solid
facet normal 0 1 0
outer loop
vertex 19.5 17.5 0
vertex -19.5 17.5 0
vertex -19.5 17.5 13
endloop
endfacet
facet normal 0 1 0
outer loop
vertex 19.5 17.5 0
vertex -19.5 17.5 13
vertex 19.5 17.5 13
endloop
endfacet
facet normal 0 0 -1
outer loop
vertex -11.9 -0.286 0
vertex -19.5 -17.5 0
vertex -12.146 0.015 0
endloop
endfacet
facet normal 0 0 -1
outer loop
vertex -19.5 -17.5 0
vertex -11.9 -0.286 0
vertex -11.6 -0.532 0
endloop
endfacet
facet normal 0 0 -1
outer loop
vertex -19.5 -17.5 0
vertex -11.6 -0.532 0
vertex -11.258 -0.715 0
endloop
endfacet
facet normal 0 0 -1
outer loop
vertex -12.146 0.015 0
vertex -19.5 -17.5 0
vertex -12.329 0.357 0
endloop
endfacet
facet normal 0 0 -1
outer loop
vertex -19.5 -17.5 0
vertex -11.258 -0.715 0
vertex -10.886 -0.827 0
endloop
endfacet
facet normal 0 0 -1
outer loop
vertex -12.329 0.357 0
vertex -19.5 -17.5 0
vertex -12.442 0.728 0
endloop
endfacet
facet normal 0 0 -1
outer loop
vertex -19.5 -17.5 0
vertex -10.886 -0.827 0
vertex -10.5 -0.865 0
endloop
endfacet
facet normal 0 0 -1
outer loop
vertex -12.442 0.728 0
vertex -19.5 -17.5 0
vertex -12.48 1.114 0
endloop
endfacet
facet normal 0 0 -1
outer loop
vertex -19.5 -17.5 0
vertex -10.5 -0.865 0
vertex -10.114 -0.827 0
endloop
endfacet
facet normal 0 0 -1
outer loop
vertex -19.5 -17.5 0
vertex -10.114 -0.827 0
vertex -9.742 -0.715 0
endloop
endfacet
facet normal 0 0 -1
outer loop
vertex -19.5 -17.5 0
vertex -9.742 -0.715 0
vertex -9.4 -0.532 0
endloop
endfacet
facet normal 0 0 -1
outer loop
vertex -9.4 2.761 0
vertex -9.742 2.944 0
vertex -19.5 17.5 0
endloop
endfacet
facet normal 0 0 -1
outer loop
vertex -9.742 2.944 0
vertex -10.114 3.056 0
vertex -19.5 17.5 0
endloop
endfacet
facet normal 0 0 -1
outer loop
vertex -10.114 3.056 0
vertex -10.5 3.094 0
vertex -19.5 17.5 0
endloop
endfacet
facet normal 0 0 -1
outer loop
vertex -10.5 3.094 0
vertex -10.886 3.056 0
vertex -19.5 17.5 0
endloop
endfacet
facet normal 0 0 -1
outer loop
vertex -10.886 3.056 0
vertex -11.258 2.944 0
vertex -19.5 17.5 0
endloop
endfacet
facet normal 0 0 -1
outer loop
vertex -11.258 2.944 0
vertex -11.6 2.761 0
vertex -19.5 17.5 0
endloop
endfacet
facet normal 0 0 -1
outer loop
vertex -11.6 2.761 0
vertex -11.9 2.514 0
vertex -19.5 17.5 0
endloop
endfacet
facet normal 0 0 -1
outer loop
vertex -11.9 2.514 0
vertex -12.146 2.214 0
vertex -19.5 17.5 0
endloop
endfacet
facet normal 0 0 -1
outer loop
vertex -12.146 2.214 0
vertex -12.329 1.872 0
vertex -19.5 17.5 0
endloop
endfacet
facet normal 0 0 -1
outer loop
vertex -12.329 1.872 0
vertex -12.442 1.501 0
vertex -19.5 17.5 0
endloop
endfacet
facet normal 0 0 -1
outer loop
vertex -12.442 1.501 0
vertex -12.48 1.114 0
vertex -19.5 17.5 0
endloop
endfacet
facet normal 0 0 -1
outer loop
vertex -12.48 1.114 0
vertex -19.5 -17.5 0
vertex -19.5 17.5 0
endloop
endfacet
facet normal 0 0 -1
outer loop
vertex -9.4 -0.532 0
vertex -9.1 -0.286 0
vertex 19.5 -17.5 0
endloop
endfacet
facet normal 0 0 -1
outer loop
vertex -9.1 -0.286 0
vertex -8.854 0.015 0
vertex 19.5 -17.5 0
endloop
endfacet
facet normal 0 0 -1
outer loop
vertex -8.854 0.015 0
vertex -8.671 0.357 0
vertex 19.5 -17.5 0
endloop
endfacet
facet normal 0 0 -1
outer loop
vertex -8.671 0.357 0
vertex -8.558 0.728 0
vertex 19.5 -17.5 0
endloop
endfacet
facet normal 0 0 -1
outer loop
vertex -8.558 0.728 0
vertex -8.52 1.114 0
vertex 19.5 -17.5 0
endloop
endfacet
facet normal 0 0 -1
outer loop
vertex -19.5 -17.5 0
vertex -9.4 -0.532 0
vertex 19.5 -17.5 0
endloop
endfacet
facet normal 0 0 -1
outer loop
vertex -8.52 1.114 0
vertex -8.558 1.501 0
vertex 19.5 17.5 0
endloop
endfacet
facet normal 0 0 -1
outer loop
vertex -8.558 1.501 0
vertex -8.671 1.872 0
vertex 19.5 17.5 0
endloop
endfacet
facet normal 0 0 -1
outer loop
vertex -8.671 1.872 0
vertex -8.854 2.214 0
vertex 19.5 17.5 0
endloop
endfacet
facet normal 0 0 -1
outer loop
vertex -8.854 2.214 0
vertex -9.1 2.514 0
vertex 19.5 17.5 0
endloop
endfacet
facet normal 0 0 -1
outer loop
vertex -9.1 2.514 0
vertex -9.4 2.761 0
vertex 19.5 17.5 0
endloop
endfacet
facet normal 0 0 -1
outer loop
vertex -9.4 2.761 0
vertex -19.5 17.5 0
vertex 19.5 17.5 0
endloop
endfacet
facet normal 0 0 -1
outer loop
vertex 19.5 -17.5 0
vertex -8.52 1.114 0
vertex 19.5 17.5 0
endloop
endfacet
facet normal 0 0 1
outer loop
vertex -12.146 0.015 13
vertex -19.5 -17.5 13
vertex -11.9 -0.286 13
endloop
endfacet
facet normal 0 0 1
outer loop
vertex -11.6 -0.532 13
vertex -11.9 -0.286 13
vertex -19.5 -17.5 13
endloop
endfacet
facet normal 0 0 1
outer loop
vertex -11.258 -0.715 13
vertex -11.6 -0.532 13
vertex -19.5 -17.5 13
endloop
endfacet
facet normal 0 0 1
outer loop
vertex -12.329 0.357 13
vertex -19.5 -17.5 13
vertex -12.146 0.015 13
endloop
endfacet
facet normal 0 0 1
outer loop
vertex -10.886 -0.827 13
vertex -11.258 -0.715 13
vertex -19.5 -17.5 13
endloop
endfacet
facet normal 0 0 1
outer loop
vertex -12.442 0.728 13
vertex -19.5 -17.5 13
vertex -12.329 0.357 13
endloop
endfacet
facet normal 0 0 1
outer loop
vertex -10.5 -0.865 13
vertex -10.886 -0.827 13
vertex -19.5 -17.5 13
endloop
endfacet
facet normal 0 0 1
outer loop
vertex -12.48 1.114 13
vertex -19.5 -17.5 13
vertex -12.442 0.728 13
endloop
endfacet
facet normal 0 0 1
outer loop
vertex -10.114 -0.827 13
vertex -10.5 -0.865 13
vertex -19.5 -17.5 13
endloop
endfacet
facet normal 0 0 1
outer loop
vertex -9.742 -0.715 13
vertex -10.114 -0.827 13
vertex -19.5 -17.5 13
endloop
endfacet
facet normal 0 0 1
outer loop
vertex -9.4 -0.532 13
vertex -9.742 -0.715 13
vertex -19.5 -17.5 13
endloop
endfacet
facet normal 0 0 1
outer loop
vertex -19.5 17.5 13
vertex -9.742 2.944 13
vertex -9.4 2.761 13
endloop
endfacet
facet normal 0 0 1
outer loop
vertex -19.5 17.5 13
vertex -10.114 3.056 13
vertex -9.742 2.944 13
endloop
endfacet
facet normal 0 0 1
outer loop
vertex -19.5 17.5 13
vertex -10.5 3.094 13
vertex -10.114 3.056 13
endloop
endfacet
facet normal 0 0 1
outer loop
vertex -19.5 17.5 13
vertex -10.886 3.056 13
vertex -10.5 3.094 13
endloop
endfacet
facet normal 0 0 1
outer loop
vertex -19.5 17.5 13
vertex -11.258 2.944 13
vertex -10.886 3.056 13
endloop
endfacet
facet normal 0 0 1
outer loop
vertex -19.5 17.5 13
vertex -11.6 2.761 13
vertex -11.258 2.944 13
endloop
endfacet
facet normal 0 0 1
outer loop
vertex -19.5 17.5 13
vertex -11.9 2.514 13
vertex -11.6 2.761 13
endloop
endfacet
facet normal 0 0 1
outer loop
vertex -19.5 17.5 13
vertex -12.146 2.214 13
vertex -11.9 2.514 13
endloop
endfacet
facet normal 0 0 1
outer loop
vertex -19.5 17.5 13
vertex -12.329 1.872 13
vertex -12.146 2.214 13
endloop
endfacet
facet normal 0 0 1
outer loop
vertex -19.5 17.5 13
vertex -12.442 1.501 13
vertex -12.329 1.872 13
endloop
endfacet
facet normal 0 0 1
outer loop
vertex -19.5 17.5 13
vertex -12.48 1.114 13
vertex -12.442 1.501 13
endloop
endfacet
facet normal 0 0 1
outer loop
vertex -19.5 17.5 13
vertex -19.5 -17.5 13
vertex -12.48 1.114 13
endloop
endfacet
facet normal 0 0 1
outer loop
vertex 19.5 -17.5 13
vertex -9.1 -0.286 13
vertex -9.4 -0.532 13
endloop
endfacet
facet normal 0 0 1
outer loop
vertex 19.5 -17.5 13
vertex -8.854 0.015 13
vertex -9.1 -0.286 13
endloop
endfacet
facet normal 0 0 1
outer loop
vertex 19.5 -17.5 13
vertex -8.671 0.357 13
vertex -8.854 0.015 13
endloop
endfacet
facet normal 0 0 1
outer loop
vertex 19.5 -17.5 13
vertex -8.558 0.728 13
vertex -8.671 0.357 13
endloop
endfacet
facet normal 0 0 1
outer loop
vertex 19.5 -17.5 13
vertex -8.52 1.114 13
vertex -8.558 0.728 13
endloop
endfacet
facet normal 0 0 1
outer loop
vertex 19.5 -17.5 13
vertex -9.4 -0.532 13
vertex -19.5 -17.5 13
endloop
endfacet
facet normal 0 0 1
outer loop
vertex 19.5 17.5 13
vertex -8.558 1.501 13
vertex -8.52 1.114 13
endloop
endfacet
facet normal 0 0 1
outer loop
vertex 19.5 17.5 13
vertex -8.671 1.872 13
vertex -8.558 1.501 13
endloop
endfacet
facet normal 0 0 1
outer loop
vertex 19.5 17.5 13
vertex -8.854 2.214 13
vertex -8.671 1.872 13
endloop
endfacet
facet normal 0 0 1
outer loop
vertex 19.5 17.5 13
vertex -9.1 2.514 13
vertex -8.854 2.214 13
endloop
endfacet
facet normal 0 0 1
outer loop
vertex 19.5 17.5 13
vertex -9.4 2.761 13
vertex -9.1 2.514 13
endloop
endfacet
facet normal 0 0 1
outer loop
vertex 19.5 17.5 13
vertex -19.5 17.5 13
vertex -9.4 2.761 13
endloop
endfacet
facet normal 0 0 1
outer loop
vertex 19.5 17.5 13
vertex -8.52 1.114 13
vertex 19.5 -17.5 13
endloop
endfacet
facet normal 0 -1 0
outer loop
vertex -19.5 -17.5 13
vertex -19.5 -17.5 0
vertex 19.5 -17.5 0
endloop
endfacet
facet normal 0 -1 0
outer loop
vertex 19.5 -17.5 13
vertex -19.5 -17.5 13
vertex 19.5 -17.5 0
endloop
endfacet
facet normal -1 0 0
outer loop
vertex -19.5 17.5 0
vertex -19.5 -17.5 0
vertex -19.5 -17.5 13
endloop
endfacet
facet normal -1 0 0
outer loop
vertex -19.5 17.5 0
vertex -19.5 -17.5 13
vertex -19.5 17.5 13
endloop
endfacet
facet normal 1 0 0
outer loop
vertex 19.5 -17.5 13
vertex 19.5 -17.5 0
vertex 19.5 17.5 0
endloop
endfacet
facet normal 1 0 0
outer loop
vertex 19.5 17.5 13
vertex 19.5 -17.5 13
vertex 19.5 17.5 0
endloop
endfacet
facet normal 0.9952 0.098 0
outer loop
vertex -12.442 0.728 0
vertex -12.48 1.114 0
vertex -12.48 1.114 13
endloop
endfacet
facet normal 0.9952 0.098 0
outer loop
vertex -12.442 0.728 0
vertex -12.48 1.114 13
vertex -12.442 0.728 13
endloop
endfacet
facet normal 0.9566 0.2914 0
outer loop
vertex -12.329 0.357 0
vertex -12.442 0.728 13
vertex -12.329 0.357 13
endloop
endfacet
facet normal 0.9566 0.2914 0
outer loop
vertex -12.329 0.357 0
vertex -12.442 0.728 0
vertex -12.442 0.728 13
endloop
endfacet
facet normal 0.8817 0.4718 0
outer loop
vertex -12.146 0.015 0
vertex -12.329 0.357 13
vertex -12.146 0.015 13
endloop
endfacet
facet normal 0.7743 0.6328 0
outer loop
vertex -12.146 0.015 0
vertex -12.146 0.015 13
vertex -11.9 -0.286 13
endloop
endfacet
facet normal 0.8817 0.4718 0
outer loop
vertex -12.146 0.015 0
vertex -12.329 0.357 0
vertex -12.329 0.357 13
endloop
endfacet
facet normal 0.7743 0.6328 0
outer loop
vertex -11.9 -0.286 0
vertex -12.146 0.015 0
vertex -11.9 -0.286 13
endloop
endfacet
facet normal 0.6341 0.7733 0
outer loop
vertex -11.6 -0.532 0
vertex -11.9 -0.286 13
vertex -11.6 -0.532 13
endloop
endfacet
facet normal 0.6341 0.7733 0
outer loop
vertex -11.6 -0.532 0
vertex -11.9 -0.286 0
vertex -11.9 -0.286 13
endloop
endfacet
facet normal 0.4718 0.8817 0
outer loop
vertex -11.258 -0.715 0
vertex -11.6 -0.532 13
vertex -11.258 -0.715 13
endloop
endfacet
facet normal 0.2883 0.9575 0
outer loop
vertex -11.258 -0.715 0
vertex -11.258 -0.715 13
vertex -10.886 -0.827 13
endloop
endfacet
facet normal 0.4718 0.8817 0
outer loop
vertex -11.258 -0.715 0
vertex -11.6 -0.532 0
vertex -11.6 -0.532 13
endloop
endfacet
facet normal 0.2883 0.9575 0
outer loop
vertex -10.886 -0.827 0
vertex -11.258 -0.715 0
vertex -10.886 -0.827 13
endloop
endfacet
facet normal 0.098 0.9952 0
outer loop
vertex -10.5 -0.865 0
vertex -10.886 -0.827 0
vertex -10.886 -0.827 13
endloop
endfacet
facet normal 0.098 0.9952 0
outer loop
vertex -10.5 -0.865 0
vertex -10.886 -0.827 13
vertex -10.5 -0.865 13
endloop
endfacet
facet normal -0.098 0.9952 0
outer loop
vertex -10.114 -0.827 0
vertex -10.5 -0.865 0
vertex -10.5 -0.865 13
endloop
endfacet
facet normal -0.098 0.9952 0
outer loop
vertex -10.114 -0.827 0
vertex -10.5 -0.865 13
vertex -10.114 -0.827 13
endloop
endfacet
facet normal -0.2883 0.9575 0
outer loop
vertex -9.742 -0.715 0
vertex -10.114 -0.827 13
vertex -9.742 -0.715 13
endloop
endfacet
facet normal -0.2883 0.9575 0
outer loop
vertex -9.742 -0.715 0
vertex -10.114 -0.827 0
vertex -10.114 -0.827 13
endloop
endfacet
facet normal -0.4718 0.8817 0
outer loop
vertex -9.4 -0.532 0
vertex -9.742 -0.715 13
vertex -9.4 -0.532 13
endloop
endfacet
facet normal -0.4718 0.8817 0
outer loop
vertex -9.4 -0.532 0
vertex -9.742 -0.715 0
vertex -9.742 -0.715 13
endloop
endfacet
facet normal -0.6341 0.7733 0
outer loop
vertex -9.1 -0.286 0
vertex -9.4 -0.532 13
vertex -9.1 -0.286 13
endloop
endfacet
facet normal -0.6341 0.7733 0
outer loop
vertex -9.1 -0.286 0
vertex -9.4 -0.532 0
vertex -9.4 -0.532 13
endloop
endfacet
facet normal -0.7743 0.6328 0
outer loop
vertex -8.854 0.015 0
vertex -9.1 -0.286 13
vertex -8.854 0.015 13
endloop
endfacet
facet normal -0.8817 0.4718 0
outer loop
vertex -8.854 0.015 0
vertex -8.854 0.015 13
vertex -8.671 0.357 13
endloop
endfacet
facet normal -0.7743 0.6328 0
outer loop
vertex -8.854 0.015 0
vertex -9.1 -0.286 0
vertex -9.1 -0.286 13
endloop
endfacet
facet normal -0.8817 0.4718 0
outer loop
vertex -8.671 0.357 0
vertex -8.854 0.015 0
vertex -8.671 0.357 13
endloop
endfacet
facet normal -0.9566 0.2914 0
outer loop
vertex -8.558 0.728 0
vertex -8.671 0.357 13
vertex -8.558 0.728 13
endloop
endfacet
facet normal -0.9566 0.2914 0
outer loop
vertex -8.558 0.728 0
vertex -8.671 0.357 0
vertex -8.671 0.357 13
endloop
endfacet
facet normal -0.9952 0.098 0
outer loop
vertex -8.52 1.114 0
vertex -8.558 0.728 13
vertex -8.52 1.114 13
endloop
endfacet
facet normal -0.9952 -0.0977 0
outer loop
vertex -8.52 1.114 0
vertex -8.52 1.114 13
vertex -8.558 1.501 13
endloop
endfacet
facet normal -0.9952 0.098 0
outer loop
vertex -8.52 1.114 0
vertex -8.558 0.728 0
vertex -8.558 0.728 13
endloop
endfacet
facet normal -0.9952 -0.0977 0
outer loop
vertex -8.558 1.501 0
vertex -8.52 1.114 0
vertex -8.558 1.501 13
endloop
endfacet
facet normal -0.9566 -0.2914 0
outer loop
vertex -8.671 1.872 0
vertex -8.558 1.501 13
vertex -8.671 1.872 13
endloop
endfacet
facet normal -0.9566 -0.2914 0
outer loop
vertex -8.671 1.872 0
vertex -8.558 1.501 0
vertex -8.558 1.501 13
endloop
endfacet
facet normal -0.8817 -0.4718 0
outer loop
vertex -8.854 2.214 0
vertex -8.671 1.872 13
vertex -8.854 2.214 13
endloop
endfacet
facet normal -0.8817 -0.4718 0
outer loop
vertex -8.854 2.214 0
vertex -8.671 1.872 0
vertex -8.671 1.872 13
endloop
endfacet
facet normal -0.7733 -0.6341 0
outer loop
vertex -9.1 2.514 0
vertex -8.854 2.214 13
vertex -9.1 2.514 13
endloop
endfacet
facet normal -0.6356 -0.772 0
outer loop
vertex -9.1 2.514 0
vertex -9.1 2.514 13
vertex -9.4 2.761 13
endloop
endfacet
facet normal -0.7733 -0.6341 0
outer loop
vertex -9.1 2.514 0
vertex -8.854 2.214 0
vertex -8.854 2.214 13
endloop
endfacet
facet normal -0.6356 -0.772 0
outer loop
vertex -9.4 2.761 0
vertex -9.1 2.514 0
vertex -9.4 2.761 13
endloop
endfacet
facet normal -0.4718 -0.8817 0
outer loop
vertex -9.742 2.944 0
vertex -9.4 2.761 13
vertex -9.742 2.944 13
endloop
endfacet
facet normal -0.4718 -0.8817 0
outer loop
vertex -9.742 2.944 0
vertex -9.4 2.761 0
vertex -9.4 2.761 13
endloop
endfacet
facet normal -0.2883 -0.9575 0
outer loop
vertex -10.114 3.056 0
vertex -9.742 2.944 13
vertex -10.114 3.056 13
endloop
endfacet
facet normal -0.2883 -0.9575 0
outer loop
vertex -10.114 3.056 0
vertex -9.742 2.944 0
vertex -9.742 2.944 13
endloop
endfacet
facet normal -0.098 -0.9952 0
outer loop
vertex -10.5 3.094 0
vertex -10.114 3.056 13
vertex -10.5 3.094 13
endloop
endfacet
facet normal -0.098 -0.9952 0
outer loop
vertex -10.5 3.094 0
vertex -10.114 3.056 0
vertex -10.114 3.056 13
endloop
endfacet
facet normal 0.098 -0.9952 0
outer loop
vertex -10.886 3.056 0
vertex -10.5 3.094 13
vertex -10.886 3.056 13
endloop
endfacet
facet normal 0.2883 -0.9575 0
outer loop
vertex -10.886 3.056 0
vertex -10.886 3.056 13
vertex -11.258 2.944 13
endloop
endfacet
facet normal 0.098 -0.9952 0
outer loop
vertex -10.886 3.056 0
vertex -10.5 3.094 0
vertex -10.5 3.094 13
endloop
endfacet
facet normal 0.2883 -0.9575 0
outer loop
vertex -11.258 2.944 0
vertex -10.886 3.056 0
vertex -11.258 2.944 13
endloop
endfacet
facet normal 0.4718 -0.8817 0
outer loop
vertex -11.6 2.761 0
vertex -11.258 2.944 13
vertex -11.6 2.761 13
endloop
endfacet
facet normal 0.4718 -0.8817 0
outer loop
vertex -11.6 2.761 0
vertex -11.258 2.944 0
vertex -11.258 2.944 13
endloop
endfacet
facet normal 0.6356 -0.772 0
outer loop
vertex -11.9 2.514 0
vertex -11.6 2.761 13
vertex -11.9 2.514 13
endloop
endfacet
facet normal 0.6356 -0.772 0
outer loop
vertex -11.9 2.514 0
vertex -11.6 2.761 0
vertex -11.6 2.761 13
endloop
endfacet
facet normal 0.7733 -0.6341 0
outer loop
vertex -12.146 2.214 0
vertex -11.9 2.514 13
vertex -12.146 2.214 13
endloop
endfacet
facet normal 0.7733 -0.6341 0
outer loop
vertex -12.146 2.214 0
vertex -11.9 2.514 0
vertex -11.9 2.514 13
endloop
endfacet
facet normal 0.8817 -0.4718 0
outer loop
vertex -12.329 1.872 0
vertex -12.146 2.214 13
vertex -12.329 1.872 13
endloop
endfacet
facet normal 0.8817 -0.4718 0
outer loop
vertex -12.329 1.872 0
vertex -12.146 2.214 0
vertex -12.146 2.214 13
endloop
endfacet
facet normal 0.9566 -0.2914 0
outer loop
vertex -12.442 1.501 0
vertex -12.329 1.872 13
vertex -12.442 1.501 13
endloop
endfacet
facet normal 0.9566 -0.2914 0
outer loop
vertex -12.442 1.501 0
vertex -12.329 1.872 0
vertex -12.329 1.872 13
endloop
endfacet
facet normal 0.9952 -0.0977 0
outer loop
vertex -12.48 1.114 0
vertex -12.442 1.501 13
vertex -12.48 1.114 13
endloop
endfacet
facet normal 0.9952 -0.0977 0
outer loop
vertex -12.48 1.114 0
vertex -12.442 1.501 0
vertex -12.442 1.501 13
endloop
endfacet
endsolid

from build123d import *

# Parameters (mm, degrees)
IZIM1_W                     = 39
IZIM1_H                     = 35
IZIM1_R                     = 1.979898987
Y_KSEKLIK_EKSTR_ZYON1_DEPTH = 13


with BuildPart() as part:
    # Çizim1 → Yükseklik-Ekstrüzyon1 (new body)
    with BuildSketch(Plane.XY):
        Rectangle(IZIM1_W, IZIM1_H)
        with Locations(Location((-10.5, 1.114473684, 0), (0, 0, 180))):
            Circle(IZIM1_R, mode=Mode.SUBTRACT)
    extrude(amount=Y_KSEKLIK_EKSTR_ZYON1_DEPTH)


solid = part.part
